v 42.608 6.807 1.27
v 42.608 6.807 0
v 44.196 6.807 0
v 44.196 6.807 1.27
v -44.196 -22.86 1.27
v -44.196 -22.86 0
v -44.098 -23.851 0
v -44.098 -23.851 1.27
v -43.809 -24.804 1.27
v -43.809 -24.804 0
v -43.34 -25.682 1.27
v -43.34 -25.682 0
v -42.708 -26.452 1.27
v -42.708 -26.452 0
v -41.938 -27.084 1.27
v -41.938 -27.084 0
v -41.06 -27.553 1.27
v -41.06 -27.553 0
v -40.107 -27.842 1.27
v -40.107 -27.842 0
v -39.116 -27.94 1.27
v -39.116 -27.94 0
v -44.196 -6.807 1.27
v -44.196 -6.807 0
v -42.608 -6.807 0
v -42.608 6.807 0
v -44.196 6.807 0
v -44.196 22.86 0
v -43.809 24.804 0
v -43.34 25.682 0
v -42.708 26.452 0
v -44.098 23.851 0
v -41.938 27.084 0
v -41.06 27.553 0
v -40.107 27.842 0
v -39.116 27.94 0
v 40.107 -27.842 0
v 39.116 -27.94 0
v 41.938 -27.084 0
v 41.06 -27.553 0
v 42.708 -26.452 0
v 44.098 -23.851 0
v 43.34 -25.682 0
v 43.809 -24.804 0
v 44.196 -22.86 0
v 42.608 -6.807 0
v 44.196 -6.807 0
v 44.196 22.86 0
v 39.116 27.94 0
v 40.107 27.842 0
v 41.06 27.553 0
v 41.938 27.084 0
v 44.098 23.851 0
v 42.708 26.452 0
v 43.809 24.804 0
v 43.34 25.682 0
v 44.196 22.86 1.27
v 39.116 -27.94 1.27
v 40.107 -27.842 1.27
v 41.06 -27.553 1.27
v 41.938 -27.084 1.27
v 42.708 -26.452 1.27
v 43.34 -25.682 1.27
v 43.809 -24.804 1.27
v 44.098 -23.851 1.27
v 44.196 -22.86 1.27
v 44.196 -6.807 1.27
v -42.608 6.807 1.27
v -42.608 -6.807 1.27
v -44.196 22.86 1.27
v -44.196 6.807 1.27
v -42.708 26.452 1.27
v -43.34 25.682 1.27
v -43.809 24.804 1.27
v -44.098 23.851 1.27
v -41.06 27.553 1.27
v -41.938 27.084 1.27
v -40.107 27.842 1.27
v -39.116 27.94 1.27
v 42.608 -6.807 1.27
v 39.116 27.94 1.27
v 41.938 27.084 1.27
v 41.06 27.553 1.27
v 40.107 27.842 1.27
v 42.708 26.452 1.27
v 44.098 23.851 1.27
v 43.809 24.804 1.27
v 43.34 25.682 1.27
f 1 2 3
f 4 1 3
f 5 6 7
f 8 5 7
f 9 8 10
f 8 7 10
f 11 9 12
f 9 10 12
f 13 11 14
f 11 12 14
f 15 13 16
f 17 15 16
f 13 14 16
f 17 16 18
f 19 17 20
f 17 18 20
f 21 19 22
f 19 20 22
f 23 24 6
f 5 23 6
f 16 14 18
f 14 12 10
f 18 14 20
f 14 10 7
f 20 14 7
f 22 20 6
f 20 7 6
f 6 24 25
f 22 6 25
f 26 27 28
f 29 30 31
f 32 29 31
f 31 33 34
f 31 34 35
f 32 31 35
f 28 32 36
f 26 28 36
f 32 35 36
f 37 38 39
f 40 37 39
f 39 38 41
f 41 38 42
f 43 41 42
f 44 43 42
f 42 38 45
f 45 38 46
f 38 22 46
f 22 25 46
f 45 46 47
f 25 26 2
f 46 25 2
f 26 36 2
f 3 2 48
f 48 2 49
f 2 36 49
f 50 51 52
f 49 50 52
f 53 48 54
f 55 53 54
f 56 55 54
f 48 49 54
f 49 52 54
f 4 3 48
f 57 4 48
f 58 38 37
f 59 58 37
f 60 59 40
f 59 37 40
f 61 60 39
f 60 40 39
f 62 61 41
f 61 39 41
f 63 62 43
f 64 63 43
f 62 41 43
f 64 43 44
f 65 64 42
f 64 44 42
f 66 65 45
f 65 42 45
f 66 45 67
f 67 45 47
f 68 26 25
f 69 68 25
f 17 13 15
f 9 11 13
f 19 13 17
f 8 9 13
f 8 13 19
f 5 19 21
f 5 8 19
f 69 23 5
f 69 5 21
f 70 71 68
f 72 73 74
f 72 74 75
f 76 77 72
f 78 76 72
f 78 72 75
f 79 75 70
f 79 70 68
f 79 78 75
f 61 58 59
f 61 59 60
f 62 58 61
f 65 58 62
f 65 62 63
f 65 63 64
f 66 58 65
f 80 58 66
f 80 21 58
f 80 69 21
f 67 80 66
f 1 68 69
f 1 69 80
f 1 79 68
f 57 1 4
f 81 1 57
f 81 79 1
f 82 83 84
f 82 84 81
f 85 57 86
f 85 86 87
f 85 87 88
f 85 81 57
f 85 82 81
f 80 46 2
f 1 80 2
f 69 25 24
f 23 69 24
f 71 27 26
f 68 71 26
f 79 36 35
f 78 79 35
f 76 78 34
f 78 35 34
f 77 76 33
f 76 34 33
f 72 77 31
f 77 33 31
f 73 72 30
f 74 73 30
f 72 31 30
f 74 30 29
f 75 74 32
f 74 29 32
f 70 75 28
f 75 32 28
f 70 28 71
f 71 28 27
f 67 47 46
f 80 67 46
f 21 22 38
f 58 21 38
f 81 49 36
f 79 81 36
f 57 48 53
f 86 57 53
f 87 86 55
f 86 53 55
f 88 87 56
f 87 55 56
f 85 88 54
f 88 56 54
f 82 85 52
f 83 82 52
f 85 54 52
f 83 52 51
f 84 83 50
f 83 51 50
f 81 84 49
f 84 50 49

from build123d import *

# Parameters (mm, degrees)
F1_DEPTH = 1.27


with BuildPart() as f1:
    # F0 (on Top) → F1 (new body)
    with BuildSketch(Plane.XY):
        with BuildLine():
            ThreePointArc((44.196, 22.86), (42.708102, 26.452102), (39.116, 27.94))
            Line((39.116, 27.94), (-39.116, 27.94))
            ThreePointArc((-39.116, 27.94), (-42.708102, 26.452102), (-44.196, 22.86))
            Line((-44.196, 22.86), (-44.196, 6.8072))
            Line((-44.196, 6.8072), (-43.4975, 6.8072))
            Line((-43.4975, 6.8072), (-42.799, 6.8072))
            Line((-42.799, 6.8072), (-42.6085, 6.8072))
            Line((-42.6085, 6.8072), (-42.6085, -6.8072))
            Line((-42.6085, -6.8072), (-42.799, -6.8072))
            Line((-42.799, -6.8072), (-43.4975, -6.8072))
            Line((-43.4975, -6.8072), (-44.196, -6.8072))
            Line((-44.196, -6.8072), (-44.196, -22.86))
            ThreePointArc((-44.196, -22.86), (-42.708102, -26.452102), (-39.116, -27.94))
            Line((-39.116, -27.94), (39.116, -27.94))
            ThreePointArc((39.116, -27.94), (42.708102, -26.452102), (44.196, -22.86))
            Line((44.196, -22.86), (44.196, -6.8072))
            Line((44.196, -6.8072), (43.4975, -6.8072))
            Line((43.4975, -6.8072), (42.799, -6.8072))
            Line((42.799, -6.8072), (42.6085, -6.8072))
            Line((42.6085, -6.8072), (42.6085, 6.8072))
            Line((42.6085, 6.8072), (42.799, 6.8072))
            Line((42.799, 6.8072), (43.4975, 6.8072))
            Line((43.4975, 6.8072), (44.196, 6.8072))
            Line((44.196, 6.8072), (44.196, 22.86))
        make_face()
    extrude(amount=F1_DEPTH)


solid = f1.part
